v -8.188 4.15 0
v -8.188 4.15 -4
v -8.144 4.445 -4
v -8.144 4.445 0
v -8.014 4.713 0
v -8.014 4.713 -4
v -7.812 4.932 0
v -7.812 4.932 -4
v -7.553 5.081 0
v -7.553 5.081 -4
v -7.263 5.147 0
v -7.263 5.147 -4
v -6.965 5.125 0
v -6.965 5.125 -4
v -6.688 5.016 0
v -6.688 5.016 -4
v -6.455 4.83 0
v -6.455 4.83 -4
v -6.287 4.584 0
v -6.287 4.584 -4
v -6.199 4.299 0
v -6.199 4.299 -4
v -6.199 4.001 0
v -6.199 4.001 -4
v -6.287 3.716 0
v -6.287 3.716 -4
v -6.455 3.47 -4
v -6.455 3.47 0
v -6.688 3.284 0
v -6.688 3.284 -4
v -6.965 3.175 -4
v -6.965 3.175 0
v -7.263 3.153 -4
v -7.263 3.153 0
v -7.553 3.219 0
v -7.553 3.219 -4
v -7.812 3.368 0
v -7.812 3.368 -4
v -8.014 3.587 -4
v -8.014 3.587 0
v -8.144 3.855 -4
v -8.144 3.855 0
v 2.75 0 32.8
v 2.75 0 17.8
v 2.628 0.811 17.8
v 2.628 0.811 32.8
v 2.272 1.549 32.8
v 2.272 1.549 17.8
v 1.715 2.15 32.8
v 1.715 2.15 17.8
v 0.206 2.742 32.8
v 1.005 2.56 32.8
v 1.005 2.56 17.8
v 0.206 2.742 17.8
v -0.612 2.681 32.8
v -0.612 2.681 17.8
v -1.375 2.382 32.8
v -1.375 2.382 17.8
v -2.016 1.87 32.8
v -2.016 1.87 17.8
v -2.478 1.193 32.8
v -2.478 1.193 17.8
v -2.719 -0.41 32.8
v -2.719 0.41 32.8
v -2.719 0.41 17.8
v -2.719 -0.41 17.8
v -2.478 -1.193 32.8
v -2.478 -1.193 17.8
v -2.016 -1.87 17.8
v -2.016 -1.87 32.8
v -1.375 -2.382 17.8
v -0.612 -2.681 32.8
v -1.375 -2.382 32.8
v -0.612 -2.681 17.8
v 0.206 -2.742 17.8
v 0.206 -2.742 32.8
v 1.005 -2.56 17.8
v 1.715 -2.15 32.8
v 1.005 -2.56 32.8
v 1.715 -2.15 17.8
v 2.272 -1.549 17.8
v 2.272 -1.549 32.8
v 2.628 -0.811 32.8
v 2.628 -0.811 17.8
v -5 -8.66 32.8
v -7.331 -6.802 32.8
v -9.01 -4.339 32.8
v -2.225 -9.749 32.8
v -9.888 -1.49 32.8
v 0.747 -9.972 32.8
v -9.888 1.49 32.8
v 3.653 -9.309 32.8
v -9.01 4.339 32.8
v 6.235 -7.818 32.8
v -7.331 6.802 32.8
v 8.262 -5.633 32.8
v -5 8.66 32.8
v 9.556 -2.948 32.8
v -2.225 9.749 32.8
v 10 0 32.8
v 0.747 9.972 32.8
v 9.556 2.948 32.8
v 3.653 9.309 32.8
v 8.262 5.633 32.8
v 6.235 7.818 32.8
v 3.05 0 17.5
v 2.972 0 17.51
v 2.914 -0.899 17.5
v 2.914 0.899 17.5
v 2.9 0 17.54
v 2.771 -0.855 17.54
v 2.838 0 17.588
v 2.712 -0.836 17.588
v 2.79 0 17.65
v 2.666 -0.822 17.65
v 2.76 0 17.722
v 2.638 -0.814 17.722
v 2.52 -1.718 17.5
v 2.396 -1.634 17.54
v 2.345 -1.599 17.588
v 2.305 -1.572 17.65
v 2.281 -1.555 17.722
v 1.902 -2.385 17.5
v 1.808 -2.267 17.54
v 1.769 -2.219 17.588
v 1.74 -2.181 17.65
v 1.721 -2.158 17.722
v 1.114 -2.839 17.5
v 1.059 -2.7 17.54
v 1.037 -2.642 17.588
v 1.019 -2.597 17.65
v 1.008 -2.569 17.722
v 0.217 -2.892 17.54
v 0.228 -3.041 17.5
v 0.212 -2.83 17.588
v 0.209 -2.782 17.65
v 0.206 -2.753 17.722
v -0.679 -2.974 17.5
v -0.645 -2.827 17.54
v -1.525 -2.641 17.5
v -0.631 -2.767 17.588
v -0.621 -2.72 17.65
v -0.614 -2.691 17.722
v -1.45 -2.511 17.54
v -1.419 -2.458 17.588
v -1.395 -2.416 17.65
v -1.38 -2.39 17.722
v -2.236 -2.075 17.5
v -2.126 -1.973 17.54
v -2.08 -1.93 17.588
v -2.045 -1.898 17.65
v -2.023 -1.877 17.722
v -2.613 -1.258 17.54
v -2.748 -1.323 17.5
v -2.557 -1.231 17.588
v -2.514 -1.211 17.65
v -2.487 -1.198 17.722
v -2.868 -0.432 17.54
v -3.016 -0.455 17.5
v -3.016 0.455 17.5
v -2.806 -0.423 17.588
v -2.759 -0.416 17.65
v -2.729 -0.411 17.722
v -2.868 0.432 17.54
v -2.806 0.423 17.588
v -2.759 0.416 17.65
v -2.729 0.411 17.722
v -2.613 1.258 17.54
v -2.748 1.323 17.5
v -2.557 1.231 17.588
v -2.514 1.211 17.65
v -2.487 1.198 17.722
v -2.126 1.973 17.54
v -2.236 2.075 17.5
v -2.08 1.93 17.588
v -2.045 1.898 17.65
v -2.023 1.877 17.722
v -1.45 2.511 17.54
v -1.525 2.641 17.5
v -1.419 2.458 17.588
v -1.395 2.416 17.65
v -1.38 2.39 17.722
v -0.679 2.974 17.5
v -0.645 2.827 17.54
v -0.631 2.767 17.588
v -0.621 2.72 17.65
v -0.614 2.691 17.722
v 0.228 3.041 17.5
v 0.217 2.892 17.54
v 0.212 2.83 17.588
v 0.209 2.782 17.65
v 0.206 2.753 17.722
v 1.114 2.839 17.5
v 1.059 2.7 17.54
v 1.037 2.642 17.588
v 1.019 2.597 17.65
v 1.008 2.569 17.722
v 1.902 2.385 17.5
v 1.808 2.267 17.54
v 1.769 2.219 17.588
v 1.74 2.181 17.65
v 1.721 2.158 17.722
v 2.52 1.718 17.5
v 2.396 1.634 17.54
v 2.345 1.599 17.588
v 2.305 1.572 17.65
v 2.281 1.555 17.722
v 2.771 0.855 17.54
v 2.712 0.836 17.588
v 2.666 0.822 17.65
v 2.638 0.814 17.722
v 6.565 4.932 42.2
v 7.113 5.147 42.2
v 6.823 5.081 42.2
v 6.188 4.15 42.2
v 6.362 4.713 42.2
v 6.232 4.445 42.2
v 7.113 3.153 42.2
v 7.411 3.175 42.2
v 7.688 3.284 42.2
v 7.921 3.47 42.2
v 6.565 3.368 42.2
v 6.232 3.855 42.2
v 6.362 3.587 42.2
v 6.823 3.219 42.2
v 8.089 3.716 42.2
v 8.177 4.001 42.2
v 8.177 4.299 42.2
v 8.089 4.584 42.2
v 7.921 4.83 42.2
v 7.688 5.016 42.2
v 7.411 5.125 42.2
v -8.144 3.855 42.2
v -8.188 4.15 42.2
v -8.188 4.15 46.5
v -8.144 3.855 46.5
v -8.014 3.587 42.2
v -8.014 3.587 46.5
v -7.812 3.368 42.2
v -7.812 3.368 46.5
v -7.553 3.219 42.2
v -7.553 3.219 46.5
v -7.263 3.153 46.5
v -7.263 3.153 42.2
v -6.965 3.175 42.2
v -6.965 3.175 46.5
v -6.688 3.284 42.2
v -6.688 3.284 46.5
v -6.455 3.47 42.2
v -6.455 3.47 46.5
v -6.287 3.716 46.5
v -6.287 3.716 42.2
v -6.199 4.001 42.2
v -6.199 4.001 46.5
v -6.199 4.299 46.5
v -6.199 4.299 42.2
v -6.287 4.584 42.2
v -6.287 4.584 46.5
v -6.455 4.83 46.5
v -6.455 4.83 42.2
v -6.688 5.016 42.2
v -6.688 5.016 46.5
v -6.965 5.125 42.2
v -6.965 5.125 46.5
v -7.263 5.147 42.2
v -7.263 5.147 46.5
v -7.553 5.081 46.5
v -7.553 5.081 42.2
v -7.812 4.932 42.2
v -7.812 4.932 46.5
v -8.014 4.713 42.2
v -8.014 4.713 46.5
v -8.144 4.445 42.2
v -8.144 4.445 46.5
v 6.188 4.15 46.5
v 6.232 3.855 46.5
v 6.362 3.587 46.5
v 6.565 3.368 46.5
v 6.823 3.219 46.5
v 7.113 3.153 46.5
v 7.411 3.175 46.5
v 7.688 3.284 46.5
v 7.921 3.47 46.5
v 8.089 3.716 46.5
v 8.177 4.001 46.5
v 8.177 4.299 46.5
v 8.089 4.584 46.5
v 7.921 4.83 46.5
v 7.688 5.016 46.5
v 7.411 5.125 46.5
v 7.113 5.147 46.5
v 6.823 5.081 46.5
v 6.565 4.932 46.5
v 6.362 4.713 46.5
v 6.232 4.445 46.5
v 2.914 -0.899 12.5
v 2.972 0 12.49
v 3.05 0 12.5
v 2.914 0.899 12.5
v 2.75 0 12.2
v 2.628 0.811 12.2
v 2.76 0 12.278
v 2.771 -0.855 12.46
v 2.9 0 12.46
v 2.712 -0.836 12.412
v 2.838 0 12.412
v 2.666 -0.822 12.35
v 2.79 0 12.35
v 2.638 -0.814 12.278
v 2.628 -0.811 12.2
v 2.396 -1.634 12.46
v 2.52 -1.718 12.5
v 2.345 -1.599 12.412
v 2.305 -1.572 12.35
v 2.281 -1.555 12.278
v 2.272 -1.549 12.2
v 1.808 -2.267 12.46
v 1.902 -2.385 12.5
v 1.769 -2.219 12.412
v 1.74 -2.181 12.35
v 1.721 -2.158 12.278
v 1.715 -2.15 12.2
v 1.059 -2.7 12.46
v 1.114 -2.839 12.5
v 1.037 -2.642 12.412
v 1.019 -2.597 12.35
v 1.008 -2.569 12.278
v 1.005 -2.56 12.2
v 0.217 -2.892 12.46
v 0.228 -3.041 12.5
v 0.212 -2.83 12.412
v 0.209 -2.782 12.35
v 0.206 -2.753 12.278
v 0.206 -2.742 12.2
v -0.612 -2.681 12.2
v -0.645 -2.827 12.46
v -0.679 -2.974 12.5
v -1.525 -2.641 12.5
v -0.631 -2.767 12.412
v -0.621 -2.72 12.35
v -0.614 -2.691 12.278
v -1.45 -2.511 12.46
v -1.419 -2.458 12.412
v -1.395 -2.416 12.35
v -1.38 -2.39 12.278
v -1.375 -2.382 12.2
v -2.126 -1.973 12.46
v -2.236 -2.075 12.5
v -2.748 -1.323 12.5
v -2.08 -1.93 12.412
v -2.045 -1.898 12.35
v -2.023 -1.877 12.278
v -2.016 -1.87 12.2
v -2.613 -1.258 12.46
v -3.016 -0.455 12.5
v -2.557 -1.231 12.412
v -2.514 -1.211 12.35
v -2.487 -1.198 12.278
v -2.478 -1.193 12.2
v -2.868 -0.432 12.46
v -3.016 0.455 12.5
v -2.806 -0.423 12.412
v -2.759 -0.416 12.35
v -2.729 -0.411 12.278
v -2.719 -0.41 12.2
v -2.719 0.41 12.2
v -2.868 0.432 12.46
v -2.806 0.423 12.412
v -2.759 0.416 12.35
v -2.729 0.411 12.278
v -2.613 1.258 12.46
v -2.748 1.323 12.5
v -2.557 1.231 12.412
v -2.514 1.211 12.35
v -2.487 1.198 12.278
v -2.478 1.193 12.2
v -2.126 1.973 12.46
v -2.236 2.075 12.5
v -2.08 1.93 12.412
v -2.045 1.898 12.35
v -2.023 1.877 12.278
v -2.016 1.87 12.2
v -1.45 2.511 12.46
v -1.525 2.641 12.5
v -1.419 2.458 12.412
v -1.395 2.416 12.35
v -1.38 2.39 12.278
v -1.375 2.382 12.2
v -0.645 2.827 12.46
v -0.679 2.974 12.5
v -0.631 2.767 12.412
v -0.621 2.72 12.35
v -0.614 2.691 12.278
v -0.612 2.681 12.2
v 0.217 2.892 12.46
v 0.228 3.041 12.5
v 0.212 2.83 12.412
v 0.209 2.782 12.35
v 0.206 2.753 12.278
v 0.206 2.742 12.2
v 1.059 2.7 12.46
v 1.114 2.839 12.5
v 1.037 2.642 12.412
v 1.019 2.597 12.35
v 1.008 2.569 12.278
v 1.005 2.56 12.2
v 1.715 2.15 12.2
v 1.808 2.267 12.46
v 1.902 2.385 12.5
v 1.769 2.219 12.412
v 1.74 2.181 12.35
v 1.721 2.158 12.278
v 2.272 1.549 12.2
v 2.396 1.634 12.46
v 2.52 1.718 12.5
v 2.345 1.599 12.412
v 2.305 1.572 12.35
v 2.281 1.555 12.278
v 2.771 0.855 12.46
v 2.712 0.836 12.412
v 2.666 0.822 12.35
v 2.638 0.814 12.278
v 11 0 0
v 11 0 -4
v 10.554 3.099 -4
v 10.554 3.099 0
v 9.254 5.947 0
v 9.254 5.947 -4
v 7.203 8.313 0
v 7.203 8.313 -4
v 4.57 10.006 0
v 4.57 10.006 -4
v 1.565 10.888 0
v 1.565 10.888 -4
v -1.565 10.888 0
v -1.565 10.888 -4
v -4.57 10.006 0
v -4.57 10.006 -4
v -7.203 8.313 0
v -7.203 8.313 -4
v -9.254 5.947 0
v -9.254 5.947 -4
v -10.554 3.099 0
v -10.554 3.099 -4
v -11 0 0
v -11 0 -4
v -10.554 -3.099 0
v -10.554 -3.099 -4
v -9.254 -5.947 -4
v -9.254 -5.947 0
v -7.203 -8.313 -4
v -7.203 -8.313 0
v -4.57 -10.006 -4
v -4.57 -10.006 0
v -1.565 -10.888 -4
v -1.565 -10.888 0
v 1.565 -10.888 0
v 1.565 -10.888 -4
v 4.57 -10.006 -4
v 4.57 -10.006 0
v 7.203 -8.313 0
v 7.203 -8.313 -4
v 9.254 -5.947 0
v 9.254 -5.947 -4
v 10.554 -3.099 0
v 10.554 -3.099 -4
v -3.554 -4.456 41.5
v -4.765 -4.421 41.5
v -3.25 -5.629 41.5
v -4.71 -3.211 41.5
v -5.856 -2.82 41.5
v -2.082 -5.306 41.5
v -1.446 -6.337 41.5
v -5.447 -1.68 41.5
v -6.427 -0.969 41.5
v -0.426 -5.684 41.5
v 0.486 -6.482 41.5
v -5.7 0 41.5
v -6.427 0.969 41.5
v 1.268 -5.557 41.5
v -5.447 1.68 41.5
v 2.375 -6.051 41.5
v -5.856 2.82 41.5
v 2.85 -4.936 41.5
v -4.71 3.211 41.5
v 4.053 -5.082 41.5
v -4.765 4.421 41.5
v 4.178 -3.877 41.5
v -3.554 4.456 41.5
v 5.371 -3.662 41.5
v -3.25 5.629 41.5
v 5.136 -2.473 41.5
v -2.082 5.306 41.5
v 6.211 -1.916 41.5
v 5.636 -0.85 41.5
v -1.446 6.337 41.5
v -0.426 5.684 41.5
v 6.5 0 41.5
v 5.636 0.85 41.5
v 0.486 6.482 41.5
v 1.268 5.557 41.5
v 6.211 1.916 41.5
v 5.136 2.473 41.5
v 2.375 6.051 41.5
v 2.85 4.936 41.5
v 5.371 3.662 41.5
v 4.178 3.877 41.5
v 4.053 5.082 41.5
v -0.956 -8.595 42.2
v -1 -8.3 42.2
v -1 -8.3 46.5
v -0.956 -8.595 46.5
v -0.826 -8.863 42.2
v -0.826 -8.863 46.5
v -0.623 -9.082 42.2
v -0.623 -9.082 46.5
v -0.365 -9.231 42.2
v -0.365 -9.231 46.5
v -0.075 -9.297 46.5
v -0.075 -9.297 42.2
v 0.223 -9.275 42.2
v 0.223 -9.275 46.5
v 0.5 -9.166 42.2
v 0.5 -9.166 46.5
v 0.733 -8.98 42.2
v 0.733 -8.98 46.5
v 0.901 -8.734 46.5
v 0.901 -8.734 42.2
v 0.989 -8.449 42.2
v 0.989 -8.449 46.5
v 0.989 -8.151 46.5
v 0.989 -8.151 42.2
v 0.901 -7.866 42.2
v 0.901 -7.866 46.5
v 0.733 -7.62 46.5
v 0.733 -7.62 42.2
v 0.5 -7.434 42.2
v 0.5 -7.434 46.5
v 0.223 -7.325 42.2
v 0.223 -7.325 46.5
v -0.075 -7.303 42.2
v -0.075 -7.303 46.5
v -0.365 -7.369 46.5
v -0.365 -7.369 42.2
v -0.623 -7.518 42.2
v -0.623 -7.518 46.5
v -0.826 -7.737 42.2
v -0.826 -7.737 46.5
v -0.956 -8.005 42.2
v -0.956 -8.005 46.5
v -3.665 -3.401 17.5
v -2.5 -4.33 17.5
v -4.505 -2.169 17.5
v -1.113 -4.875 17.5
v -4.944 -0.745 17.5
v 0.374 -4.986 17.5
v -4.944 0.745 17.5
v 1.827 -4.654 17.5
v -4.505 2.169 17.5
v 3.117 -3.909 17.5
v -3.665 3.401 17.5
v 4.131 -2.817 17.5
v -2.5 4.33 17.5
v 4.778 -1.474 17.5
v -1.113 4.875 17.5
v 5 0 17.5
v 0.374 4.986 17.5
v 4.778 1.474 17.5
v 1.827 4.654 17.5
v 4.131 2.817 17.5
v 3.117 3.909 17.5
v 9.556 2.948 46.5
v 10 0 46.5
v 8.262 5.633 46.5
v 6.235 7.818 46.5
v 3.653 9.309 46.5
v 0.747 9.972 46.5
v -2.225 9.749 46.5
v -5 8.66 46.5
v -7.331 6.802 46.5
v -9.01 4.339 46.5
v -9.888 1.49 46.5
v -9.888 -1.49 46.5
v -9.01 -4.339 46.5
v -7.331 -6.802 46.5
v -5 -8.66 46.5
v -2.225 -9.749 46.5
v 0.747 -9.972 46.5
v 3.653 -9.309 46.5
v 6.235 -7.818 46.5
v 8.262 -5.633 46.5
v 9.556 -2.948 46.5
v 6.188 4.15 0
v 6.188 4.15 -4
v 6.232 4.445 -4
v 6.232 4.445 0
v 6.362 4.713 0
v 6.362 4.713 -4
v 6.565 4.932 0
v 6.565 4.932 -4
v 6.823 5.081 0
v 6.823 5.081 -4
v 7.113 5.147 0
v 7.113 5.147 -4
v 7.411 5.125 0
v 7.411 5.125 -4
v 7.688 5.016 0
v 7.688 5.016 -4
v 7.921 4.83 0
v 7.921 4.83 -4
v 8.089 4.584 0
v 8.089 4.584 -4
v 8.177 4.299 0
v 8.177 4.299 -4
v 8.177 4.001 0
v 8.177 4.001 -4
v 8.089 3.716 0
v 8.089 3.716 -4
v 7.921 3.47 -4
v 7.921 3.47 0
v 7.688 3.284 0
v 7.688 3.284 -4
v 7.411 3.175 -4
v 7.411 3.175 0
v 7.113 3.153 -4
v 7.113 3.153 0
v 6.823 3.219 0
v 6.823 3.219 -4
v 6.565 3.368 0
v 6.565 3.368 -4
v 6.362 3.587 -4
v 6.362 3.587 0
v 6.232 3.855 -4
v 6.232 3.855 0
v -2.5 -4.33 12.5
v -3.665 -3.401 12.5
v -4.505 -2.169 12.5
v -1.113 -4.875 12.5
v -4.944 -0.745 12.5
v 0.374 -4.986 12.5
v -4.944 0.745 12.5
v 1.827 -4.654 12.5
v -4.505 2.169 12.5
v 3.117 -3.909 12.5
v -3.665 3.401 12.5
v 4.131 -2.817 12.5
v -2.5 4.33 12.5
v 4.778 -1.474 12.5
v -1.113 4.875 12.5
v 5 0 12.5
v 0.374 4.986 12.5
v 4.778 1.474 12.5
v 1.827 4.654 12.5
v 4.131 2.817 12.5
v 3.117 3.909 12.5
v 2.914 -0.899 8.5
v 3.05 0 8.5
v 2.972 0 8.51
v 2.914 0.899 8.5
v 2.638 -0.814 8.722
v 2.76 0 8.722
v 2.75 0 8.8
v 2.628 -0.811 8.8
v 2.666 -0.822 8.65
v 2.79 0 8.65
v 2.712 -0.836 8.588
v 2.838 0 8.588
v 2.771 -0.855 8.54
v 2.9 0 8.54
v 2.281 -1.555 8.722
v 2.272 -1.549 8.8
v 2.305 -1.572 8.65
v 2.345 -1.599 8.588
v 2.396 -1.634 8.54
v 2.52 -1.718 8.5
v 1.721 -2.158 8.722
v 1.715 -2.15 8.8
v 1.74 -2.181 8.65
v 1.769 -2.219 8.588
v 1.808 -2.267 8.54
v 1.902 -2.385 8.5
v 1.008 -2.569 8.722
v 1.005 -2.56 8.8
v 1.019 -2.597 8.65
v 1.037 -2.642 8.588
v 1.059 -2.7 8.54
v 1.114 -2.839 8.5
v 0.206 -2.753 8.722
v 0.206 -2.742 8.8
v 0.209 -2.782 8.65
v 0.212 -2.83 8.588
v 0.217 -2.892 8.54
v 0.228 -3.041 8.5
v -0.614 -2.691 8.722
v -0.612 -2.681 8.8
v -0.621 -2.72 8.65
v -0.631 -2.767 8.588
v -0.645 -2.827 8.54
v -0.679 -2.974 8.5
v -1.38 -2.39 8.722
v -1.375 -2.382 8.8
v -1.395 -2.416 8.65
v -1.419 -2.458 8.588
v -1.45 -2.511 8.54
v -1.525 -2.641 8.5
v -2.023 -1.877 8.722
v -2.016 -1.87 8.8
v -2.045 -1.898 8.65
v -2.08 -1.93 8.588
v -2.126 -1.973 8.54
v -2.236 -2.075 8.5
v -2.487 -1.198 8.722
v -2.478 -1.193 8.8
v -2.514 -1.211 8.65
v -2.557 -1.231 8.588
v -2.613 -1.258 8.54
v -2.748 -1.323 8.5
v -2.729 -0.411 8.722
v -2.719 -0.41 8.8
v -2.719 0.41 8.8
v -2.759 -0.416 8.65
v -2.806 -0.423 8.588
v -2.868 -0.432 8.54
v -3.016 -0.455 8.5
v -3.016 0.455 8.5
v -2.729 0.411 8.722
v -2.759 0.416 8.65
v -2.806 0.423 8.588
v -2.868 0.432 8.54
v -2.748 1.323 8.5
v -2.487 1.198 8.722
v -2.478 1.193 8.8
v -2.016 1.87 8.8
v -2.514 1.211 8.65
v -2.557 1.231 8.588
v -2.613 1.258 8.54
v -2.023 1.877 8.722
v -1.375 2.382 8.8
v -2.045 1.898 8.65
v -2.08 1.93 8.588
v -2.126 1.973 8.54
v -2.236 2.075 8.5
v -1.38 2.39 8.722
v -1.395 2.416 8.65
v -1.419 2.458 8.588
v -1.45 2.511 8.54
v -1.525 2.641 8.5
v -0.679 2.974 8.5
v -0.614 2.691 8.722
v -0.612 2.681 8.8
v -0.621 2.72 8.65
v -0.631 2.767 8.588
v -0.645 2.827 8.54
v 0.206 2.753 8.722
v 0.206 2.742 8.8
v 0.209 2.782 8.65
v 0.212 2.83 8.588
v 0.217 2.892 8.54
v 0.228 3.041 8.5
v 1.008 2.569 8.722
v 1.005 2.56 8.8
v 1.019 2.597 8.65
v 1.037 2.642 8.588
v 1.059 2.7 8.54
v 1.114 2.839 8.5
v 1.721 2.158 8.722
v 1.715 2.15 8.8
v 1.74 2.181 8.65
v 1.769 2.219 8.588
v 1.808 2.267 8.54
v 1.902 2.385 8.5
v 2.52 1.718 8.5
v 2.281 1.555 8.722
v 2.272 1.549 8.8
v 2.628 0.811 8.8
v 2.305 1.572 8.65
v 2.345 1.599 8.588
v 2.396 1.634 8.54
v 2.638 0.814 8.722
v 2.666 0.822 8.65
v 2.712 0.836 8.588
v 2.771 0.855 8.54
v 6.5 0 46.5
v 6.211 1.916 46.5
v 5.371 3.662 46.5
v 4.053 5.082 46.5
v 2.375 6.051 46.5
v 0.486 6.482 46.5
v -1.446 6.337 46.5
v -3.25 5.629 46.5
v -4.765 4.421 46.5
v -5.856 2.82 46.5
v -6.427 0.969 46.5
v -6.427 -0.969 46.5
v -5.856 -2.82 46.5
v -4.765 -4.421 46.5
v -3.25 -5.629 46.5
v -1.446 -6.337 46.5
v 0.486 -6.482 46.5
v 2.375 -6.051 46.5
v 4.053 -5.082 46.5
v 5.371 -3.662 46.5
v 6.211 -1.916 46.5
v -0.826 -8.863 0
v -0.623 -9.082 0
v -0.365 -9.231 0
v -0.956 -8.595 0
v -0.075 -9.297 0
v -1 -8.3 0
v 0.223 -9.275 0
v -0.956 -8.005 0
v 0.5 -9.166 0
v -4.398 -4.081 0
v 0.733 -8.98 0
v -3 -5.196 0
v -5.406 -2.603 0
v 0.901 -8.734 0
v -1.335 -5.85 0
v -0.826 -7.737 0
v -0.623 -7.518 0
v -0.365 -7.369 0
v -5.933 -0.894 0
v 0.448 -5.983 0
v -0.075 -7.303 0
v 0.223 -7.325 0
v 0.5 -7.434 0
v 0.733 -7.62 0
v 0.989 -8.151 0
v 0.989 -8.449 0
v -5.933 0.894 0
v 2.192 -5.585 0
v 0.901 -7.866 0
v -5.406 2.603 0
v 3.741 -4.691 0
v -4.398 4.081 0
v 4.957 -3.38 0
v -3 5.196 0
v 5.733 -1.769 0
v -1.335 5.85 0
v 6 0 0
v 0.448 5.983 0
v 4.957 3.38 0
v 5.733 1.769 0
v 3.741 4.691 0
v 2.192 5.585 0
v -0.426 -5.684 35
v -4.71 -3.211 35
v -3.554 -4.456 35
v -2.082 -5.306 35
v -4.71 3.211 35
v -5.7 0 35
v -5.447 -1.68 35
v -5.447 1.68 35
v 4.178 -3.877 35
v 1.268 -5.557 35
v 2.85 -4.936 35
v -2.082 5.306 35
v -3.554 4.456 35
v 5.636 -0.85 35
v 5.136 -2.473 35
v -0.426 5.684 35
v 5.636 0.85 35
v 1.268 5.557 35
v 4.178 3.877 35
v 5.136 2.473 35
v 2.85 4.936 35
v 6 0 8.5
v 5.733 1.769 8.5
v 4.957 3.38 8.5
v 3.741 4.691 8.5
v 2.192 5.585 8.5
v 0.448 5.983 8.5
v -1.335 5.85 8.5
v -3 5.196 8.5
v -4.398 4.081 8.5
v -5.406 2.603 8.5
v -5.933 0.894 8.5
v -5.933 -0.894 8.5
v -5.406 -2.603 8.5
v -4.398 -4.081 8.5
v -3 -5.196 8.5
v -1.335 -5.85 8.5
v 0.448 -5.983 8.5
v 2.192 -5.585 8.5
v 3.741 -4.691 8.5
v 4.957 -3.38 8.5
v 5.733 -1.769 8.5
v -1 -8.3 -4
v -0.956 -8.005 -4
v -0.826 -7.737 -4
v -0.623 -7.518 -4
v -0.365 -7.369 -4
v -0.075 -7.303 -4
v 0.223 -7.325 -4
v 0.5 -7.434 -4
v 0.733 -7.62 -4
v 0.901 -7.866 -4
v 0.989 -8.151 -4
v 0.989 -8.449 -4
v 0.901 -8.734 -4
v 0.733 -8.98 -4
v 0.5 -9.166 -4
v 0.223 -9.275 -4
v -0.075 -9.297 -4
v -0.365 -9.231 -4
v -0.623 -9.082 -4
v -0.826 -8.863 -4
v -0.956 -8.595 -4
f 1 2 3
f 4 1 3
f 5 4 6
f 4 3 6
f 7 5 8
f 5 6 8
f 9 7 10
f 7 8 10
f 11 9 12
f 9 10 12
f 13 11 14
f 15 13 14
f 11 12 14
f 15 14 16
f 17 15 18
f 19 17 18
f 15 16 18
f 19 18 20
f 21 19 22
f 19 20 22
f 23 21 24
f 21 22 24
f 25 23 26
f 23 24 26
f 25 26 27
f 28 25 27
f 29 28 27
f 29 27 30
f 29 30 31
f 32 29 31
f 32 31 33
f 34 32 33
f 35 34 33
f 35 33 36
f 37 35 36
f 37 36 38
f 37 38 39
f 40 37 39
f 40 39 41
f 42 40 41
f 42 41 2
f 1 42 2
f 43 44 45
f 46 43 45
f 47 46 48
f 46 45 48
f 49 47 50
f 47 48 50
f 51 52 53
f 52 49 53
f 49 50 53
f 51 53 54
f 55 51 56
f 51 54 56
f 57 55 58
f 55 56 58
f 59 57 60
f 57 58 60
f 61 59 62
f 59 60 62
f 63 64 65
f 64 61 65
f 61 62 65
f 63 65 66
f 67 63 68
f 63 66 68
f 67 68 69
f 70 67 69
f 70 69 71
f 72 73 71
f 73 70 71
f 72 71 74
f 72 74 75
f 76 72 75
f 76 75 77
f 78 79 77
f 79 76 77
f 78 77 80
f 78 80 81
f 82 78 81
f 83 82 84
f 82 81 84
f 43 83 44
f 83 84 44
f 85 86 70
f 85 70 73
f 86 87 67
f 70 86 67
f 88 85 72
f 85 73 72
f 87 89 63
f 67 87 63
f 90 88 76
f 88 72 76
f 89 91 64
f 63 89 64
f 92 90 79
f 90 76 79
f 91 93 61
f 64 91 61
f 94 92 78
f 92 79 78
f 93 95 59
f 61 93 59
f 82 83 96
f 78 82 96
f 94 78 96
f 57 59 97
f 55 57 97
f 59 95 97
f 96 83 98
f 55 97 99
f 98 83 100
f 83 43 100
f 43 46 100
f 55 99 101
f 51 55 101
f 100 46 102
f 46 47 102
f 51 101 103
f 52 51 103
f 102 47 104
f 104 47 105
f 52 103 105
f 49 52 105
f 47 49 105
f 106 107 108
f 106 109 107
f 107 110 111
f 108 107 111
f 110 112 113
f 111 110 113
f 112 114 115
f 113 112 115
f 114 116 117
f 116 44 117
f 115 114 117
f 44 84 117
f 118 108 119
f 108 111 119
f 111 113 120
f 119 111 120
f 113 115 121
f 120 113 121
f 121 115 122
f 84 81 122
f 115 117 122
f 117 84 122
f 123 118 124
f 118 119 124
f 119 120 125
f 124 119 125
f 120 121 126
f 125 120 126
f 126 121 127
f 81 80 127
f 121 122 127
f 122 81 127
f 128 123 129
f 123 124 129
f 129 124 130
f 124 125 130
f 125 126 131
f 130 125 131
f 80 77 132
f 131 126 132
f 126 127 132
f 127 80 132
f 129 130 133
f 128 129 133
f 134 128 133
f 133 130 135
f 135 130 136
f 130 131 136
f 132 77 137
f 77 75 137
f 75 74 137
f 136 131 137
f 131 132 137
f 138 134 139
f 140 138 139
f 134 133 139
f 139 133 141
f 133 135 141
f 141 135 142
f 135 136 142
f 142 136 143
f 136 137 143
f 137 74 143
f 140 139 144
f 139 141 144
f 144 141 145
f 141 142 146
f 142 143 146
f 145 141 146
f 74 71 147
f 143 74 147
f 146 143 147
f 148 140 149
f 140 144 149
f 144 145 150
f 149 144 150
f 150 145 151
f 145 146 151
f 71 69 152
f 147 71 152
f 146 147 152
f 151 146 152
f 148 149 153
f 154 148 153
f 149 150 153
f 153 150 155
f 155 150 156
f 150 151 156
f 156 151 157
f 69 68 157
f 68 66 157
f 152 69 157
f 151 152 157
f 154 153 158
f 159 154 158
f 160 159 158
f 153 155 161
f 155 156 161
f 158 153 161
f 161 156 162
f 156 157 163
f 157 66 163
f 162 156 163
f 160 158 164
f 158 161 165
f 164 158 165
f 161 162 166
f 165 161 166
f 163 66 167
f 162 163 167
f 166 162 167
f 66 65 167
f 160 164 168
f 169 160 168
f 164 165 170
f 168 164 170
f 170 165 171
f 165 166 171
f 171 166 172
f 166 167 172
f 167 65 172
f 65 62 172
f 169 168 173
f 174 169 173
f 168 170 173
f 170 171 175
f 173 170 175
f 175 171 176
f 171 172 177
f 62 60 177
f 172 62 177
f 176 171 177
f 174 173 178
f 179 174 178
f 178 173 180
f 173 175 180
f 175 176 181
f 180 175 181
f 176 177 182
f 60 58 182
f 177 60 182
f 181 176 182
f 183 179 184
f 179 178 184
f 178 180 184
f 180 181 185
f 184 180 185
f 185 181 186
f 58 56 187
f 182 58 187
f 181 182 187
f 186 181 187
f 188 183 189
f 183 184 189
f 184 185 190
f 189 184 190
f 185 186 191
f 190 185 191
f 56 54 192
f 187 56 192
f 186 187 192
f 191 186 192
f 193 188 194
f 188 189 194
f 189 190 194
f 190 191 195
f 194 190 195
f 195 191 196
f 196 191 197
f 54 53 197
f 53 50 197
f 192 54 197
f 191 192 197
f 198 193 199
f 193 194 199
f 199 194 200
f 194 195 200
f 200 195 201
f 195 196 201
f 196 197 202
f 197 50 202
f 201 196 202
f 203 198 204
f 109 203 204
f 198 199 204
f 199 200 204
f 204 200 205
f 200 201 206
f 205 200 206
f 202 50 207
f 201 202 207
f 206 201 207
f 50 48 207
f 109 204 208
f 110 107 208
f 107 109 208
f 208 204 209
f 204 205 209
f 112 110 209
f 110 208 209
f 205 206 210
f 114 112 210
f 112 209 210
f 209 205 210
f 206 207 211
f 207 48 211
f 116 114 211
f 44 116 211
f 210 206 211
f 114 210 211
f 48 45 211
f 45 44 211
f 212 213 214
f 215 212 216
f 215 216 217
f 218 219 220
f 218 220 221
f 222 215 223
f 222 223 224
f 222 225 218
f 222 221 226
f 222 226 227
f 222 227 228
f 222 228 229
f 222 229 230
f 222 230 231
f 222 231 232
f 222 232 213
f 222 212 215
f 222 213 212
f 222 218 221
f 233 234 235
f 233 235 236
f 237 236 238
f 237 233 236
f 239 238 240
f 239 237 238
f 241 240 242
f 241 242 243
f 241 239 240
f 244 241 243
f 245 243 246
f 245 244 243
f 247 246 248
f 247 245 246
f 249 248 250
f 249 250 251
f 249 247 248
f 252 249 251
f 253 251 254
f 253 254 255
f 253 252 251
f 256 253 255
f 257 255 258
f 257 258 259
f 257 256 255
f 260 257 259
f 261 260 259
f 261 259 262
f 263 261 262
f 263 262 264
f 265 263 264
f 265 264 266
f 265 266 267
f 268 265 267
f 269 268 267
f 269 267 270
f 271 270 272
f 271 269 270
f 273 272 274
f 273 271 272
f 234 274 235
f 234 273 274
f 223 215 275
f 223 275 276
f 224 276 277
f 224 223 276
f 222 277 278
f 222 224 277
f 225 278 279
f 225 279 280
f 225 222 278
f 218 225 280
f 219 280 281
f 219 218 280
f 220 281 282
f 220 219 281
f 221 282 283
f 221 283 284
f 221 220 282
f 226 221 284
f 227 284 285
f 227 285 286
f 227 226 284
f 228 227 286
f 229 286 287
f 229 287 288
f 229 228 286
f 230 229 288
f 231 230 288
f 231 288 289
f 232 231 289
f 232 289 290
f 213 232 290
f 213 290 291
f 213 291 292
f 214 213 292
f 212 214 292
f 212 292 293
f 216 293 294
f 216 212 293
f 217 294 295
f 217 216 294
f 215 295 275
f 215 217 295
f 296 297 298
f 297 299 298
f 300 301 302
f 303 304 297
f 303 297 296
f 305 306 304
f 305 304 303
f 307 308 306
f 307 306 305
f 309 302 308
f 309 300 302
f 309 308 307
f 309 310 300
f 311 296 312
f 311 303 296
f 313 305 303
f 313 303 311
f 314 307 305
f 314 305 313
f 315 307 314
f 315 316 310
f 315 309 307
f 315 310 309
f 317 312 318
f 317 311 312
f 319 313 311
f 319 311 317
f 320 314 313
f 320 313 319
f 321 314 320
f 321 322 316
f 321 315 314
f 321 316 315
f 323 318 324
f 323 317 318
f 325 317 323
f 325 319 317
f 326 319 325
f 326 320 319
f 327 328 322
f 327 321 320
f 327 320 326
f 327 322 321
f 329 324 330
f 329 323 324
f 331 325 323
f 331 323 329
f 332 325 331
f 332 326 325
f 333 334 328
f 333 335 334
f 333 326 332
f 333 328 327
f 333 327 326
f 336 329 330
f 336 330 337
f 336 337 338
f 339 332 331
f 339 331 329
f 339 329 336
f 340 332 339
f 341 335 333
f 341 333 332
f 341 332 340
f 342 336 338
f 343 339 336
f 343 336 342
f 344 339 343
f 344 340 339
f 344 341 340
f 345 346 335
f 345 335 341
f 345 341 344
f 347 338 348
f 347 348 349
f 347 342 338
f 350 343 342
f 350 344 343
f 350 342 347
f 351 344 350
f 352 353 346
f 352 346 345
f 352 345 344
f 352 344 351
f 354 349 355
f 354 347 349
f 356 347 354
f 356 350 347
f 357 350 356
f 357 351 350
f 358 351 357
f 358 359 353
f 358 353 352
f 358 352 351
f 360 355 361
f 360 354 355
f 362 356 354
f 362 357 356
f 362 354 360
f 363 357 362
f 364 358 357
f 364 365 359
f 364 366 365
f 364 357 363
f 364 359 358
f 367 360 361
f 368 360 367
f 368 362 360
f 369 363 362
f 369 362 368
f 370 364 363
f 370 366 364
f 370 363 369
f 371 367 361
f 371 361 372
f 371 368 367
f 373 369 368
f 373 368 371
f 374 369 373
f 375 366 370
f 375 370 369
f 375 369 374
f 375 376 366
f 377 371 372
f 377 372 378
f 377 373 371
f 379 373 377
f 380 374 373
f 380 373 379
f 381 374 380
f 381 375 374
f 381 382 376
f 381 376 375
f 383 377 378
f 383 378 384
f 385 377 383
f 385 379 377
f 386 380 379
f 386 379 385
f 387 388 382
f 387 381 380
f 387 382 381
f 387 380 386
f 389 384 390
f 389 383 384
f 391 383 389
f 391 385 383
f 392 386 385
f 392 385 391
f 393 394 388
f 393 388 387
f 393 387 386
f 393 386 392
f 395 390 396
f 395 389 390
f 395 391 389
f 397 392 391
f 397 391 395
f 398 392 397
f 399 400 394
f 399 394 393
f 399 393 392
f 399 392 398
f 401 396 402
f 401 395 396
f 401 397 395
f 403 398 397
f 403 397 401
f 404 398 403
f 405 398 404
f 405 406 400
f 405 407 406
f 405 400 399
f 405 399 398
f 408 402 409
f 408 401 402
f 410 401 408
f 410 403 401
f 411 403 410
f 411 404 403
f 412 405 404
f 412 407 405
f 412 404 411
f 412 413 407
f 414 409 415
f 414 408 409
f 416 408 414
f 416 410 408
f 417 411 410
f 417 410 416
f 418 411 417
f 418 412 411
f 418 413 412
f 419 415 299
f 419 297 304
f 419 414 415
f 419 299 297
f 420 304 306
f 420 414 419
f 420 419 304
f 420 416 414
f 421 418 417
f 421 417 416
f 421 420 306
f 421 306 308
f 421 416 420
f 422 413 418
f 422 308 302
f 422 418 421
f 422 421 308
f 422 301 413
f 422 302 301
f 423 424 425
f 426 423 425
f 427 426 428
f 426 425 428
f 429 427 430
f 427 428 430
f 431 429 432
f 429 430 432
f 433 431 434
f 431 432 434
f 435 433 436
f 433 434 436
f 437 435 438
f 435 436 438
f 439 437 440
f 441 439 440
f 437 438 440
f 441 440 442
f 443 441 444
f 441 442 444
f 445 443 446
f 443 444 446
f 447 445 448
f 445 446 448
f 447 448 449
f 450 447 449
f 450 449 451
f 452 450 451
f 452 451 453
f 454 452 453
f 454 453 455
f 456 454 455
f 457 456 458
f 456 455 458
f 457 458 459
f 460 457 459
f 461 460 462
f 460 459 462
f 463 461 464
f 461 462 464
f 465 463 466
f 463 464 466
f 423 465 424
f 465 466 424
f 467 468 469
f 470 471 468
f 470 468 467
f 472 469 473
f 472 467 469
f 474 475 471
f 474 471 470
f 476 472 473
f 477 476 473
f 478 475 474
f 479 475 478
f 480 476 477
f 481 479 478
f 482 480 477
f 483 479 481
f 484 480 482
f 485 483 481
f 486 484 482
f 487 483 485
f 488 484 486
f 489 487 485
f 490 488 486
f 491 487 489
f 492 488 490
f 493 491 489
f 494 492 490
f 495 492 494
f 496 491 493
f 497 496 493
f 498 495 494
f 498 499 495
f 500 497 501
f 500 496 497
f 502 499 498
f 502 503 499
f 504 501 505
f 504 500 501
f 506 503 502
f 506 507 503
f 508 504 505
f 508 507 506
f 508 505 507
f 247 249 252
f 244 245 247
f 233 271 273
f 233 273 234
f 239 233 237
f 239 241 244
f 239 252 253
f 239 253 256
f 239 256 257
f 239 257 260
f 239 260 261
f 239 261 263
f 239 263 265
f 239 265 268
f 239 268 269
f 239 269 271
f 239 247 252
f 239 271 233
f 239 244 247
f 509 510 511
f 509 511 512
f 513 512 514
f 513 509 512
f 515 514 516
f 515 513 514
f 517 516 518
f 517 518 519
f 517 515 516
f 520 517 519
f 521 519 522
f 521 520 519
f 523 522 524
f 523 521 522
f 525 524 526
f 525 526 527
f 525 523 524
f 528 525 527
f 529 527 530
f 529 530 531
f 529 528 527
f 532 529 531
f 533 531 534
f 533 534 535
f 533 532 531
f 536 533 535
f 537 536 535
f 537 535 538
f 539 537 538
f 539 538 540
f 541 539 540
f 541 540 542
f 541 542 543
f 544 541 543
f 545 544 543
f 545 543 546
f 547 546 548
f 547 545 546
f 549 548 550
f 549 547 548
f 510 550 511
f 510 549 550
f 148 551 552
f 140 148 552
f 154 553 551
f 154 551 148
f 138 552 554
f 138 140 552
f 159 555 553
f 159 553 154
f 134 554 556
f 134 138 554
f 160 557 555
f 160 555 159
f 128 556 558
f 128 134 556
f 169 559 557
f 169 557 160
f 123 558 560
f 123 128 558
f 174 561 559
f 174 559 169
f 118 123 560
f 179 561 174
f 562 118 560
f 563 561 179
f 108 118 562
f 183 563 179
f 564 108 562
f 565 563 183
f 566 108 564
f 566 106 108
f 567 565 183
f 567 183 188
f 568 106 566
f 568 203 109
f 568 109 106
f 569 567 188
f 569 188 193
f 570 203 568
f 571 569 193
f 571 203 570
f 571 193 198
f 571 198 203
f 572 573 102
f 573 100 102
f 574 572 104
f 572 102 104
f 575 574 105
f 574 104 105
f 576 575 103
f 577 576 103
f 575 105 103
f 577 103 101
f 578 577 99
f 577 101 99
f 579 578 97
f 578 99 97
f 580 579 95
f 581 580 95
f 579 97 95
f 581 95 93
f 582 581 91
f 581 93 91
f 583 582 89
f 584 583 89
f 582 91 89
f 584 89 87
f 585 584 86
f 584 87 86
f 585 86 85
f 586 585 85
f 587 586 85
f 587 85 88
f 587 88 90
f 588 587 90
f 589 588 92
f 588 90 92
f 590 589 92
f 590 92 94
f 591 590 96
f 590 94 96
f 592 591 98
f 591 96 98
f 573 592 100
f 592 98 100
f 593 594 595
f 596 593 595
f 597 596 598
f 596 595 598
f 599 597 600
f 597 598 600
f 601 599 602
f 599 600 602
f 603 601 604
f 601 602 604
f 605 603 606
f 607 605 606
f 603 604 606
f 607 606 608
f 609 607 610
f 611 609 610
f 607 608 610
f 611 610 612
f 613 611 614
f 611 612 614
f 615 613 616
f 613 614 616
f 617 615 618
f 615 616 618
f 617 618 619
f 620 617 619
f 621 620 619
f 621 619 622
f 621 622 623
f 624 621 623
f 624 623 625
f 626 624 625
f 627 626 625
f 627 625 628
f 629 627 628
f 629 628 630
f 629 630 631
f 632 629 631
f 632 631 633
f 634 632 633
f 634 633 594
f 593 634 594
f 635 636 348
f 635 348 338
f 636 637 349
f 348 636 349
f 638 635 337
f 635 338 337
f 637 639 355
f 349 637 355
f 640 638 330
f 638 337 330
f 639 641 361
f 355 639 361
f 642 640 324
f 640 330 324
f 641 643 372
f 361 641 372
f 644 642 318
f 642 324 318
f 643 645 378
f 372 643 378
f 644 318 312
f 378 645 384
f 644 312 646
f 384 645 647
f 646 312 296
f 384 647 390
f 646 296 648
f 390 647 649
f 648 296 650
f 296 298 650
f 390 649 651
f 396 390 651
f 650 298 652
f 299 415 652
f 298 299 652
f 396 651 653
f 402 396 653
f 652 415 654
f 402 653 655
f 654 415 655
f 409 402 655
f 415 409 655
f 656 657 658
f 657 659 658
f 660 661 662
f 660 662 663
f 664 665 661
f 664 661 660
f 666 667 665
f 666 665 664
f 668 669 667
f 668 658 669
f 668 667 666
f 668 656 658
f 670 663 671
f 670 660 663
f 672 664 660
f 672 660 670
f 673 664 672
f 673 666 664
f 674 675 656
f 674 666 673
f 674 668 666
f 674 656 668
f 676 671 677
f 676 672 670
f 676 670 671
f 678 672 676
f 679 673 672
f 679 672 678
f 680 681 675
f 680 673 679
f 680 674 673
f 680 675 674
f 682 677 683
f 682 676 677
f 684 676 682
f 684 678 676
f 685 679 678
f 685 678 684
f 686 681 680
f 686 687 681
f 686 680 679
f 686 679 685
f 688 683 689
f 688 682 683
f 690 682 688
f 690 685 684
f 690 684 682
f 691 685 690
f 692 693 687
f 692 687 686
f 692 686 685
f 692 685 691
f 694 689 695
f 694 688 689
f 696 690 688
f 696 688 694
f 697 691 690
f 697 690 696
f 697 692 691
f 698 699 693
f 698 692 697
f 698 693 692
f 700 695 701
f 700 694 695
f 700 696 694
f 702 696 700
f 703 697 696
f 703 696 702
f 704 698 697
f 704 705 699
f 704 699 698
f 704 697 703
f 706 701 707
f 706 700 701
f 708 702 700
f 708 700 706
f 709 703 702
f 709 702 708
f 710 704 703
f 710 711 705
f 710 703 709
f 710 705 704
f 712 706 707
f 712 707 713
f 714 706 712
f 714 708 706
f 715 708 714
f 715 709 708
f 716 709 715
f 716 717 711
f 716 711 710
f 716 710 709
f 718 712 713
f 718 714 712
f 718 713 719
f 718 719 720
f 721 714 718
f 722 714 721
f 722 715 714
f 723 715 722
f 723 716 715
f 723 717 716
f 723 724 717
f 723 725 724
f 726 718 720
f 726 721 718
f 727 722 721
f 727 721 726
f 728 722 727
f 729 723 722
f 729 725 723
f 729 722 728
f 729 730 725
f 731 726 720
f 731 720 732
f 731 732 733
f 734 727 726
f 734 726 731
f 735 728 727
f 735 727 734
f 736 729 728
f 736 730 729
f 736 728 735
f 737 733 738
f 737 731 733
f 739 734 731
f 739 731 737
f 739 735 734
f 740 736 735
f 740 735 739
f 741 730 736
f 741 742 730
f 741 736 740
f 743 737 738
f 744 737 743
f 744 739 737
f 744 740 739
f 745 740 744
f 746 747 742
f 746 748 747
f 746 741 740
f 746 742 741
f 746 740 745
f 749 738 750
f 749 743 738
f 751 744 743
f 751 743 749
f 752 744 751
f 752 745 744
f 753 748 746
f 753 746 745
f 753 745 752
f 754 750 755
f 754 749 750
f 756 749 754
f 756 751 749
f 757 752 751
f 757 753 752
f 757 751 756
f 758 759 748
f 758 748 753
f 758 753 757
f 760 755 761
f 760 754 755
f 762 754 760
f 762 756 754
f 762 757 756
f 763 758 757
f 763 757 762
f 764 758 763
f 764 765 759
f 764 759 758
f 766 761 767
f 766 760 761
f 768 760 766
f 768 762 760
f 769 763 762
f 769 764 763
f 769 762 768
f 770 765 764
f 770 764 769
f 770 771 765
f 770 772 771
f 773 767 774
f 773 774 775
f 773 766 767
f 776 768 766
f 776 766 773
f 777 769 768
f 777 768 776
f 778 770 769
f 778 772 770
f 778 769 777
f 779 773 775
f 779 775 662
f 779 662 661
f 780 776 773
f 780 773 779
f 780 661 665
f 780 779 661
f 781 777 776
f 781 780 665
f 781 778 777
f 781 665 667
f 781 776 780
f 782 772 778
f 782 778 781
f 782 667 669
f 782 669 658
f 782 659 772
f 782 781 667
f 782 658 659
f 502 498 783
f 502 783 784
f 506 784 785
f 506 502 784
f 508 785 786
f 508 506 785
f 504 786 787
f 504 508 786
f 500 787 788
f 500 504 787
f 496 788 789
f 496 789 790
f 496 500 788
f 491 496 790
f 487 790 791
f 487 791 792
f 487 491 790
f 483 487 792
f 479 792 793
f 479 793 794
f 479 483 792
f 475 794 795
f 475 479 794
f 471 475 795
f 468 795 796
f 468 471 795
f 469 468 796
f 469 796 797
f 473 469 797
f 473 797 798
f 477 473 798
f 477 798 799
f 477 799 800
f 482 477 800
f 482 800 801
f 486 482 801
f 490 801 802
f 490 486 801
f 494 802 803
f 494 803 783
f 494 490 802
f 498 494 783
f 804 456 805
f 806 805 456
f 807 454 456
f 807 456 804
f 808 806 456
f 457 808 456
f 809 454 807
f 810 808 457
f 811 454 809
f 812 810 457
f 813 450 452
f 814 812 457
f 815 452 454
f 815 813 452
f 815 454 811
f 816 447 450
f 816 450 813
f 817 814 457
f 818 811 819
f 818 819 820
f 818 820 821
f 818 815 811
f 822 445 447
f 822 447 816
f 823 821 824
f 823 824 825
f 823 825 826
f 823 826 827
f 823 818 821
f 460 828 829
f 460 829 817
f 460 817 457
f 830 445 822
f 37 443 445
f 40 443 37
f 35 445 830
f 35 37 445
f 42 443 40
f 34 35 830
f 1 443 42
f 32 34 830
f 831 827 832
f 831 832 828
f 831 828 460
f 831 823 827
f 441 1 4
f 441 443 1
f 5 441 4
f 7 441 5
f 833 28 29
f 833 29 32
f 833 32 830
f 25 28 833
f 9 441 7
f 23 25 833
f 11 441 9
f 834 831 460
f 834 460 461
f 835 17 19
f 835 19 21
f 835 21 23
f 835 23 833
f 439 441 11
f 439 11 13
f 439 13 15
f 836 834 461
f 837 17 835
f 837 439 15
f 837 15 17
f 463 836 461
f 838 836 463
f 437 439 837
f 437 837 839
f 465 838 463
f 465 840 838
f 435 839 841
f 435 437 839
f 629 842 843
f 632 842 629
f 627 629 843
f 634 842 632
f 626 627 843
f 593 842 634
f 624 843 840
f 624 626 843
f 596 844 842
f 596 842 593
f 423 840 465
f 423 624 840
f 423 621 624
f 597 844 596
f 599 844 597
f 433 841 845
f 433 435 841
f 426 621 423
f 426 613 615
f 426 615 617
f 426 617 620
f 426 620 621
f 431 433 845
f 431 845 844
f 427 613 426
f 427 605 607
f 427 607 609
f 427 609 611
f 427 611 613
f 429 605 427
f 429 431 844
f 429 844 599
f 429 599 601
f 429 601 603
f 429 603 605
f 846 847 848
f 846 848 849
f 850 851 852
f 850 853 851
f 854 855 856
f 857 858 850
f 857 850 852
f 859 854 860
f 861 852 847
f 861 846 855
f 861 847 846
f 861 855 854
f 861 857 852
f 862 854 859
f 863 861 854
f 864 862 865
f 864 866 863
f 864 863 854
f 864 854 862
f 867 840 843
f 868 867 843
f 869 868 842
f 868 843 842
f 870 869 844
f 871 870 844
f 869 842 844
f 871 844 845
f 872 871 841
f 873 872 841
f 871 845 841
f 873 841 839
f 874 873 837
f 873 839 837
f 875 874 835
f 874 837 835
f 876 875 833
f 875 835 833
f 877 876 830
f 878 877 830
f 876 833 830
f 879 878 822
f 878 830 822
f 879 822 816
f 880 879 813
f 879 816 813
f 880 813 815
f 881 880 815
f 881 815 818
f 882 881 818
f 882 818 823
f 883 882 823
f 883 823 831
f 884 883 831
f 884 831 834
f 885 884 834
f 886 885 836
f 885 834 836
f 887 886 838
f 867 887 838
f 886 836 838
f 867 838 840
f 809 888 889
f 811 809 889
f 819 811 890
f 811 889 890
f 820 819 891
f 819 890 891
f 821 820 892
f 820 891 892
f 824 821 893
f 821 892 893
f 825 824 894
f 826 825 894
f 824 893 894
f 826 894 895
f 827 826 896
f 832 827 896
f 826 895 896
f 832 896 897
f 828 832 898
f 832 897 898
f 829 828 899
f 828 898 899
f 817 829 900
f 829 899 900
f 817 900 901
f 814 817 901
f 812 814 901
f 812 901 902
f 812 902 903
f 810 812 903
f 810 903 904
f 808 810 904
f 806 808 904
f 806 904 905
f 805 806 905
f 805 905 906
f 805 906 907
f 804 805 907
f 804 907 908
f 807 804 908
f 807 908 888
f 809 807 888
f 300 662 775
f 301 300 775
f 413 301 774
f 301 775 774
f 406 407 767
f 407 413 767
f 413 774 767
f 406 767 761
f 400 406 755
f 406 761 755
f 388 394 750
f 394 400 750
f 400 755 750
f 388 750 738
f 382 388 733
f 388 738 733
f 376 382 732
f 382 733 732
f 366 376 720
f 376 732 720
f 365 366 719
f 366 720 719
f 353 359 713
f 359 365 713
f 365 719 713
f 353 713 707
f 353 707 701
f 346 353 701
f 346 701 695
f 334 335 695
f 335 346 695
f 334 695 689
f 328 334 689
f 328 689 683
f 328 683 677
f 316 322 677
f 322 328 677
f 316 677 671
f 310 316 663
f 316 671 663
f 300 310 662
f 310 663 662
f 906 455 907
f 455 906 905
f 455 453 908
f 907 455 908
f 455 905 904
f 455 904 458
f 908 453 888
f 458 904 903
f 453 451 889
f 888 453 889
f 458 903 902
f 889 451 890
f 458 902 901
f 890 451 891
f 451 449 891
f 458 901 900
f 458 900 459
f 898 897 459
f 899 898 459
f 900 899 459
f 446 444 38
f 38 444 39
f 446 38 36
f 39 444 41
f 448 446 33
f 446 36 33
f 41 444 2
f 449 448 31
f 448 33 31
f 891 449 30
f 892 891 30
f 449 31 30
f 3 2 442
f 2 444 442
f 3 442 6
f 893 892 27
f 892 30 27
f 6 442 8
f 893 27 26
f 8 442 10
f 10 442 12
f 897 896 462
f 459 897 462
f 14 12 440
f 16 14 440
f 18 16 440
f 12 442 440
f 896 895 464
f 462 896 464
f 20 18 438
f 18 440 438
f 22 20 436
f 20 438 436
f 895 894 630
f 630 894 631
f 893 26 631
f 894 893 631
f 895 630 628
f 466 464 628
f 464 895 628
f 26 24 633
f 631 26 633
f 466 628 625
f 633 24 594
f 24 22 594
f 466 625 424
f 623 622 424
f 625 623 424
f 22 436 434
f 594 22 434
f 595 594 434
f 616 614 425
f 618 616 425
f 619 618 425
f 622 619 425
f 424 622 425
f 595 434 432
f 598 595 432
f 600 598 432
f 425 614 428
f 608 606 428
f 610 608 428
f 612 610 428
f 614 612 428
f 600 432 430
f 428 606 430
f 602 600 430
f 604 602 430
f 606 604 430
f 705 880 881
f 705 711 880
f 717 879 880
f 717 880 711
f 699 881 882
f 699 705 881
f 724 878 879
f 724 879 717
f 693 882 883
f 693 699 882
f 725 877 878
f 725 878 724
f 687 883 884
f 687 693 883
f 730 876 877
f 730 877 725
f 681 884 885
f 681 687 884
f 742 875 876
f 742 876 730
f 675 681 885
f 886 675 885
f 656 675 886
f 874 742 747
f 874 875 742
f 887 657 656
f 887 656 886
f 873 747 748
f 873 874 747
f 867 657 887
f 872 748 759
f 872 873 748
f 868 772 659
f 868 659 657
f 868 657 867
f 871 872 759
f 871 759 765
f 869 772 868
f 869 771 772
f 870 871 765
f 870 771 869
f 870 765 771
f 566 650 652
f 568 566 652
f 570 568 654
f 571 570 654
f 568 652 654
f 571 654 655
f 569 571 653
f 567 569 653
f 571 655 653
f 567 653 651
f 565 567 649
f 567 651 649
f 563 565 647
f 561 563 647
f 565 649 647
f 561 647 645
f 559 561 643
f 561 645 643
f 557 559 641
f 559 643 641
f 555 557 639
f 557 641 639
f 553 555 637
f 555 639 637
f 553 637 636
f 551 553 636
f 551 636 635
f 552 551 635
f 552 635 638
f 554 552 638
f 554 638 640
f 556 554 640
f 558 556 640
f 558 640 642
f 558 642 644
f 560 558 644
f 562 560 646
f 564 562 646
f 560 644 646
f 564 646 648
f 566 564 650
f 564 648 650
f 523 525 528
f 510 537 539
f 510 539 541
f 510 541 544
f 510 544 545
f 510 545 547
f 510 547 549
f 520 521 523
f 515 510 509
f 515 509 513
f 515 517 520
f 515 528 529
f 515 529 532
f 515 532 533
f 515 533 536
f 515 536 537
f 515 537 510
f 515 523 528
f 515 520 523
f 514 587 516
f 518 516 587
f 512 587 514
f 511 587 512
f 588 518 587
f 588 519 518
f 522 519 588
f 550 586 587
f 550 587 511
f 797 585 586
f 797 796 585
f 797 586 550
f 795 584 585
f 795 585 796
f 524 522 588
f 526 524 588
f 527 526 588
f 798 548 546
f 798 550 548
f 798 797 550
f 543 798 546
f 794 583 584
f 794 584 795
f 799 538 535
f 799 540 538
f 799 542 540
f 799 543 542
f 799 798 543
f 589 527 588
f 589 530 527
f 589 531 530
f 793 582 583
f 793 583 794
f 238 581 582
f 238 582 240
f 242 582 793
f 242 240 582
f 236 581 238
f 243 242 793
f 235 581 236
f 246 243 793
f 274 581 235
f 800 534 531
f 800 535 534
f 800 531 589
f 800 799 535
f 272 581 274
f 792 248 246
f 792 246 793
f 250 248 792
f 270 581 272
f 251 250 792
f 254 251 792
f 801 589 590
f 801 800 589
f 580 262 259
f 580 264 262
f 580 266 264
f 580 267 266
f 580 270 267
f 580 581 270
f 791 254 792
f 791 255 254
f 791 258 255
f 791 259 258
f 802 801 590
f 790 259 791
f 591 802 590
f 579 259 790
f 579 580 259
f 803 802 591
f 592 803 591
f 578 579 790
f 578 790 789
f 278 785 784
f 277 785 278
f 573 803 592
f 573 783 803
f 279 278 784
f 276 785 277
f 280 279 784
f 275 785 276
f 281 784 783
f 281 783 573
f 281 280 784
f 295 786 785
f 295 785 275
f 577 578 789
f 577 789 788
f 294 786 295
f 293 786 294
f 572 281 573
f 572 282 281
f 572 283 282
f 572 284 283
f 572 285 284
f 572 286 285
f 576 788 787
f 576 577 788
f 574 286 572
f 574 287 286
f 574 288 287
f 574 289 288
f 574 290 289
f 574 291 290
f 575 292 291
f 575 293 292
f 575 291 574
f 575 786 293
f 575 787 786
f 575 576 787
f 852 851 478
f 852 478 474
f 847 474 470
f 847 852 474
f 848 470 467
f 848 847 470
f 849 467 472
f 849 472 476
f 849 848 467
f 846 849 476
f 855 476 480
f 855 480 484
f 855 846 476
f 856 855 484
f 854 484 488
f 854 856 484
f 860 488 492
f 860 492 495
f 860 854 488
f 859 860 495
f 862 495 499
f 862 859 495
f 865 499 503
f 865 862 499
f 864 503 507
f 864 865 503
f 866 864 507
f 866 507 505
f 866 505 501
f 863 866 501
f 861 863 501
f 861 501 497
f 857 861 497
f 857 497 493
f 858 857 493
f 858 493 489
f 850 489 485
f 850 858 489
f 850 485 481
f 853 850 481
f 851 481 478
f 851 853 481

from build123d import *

# Parameters (mm, degrees)
MOUNTING_FLANGE_START                          = -4
SKETCH1_R                                      = 11
MOUNTING_FLANGE_DEPTH                          = 4
SKETCH2_R                                      = 2.75
D5P5_CENTRAL_POST_DEPTH                        = 32.81
CLOSED_FLOOR_BELOW_SHAFT_NOSE_START            = 32.8
SKETCH3_R                                      = 10
CLOSED_FLOOR_BELOW_SHAFT_NOSE_DEPTH            = 2.2
SHAFT_AND_CLIP_CLEARANCE_START                 = 35
SKETCH4_R                                      = 10
SKETCH4_R_2                                    = 5.7
SHAFT_AND_CLIP_CLEARANCE_DEPTH                 = 6.5
LOWER_686ZZ_SEAT_START                         = 41.5
SKETCH5_R                                      = 10
SKETCH5_R_2                                    = 6.5
LOWER_686ZZ_SEAT_DEPTH                         = 5
SKETCH6_R                                      = 1
BASE_THREE_M2_THROUGH_THREAD_MAJOR_ENVEL_DEPTH = 4.01
TOP_CAP_THREE_M2_BLIND_THREAD_MAJOR_ENVE_START = -4.3
SKETCH7_R                                      = 1
TOP_CAP_THREE_M2_BLIND_THREAD_MAJOR_ENVE_DEPTH = 4.3
SKETCH8_R                                      = 6
BENCH_D12_ROOT_TO8P5_DEPTH                     = 8.5
BENCH_D10_MID_COLLAR_12P5_TO17P5_START         = 12.5
SKETCH9_R                                      = 5
BENCH_D10_MID_COLLAR_12P5_TO17P5_DEPTH         = 5
BENCH_STEP_TRANSITIONS_FILLET_R0P30_R          = 0.3


with BuildPart() as part:
    # Sketch1 → Mounting_Flange (new body)
    with BuildSketch(Plane.XY.offset(MOUNTING_FLANGE_START)):
        Circle(SKETCH1_R)
    extrude(amount=MOUNTING_FLANGE_DEPTH)

    # Sketch2 → D5p5_Central_Post (add)
    with BuildSketch(Plane.XY):
        Circle(SKETCH2_R)
    extrude(amount=D5P5_CENTRAL_POST_DEPTH)

    # Sketch3 → Closed_Floor_Below_Shaft_Nose (add)
    with BuildSketch(Plane.XY.offset(CLOSED_FLOOR_BELOW_SHAFT_NOSE_START)):
        Circle(SKETCH3_R)
    extrude(amount=CLOSED_FLOOR_BELOW_SHAFT_NOSE_DEPTH)

    # Sketch4 → Shaft_And_Clip_Clearance (add)
    with BuildSketch(Plane.XY.offset(SHAFT_AND_CLIP_CLEARANCE_START)):
        Circle(SKETCH4_R)
        with Locations(Location((0, 0, 0), (0, 0, 180))):
            Circle(SKETCH4_R_2, mode=Mode.SUBTRACT)
    extrude(amount=SHAFT_AND_CLIP_CLEARANCE_DEPTH)

    # Sketch5 → Lower_686ZZ_Seat (add)
    with BuildSketch(Plane.XY.offset(LOWER_686ZZ_SEAT_START)):
        Circle(SKETCH5_R)
        Circle(SKETCH5_R_2, mode=Mode.SUBTRACT)
    extrude(amount=LOWER_686ZZ_SEAT_DEPTH)

    # Sketch6 → Base_Three_M2_Through_Thread_Major_Envelopes (cut)
    with BuildSketch(Plane(origin=(0, 0, -4), x_dir=(-1, 0, 0), z_dir=(0, 0, -1))):
        with Locations((-7.188010851, 4.15)):
            Circle(SKETCH6_R)
        with Locations((7.188010851, 4.15)):
            Circle(SKETCH6_R)
        with Locations((0, -8.3)):
            Circle(SKETCH6_R)
    extrude(amount=-BASE_THREE_M2_THROUGH_THREAD_MAJOR_ENVEL_DEPTH, mode=Mode.SUBTRACT)

    # Sketch7 → Top_Cap_Three_M2_Blind_Thread_Major_Envelopes (cut)
    with BuildSketch(Plane.XY.offset(46.5).offset(TOP_CAP_THREE_M2_BLIND_THREAD_MAJOR_ENVE_START)):
        with Locations(Location((7.188010851, 4.15, 0), (0, 0, 180))):
            Circle(SKETCH7_R)
        with Locations(Location((-7.188010851, 4.15, 0), (0, 0, 180))):
            Circle(SKETCH7_R)
        with Locations(Location((0, -8.3, 0), (0, 0, 180))):
            Circle(SKETCH7_R)
    extrude(amount=TOP_CAP_THREE_M2_BLIND_THREAD_MAJOR_ENVE_DEPTH, mode=Mode.SUBTRACT)

    # Sketch8 → Bench_D12_Root_To8p5 (add)
    with BuildSketch(Plane.XY):
        Circle(SKETCH8_R)
    extrude(amount=BENCH_D12_ROOT_TO8P5_DEPTH)

    # Sketch9 → Bench_D10_Mid_Collar_12p5_To17p5 (add)
    with BuildSketch(Plane.XY.offset(BENCH_D10_MID_COLLAR_12P5_TO17P5_START)):
        Circle(SKETCH9_R)
    extrude(amount=BENCH_D10_MID_COLLAR_12P5_TO17P5_DEPTH)

    # Bench_Step_Transitions_Fillet_R0p30
    bench_step_transitions_fillet_r0p30_edges = [part.edges().sort_by_distance(p)[0] for p in [
        (-2.75, 0, 8.5),
        (-2.75, 0, 12.5),
        (-2.75, 0, 17.5),
    ]]
    fillet(bench_step_transitions_fillet_r0p30_edges, radius=BENCH_STEP_TRANSITIONS_FILLET_R0P30_R)


solid = part.part
